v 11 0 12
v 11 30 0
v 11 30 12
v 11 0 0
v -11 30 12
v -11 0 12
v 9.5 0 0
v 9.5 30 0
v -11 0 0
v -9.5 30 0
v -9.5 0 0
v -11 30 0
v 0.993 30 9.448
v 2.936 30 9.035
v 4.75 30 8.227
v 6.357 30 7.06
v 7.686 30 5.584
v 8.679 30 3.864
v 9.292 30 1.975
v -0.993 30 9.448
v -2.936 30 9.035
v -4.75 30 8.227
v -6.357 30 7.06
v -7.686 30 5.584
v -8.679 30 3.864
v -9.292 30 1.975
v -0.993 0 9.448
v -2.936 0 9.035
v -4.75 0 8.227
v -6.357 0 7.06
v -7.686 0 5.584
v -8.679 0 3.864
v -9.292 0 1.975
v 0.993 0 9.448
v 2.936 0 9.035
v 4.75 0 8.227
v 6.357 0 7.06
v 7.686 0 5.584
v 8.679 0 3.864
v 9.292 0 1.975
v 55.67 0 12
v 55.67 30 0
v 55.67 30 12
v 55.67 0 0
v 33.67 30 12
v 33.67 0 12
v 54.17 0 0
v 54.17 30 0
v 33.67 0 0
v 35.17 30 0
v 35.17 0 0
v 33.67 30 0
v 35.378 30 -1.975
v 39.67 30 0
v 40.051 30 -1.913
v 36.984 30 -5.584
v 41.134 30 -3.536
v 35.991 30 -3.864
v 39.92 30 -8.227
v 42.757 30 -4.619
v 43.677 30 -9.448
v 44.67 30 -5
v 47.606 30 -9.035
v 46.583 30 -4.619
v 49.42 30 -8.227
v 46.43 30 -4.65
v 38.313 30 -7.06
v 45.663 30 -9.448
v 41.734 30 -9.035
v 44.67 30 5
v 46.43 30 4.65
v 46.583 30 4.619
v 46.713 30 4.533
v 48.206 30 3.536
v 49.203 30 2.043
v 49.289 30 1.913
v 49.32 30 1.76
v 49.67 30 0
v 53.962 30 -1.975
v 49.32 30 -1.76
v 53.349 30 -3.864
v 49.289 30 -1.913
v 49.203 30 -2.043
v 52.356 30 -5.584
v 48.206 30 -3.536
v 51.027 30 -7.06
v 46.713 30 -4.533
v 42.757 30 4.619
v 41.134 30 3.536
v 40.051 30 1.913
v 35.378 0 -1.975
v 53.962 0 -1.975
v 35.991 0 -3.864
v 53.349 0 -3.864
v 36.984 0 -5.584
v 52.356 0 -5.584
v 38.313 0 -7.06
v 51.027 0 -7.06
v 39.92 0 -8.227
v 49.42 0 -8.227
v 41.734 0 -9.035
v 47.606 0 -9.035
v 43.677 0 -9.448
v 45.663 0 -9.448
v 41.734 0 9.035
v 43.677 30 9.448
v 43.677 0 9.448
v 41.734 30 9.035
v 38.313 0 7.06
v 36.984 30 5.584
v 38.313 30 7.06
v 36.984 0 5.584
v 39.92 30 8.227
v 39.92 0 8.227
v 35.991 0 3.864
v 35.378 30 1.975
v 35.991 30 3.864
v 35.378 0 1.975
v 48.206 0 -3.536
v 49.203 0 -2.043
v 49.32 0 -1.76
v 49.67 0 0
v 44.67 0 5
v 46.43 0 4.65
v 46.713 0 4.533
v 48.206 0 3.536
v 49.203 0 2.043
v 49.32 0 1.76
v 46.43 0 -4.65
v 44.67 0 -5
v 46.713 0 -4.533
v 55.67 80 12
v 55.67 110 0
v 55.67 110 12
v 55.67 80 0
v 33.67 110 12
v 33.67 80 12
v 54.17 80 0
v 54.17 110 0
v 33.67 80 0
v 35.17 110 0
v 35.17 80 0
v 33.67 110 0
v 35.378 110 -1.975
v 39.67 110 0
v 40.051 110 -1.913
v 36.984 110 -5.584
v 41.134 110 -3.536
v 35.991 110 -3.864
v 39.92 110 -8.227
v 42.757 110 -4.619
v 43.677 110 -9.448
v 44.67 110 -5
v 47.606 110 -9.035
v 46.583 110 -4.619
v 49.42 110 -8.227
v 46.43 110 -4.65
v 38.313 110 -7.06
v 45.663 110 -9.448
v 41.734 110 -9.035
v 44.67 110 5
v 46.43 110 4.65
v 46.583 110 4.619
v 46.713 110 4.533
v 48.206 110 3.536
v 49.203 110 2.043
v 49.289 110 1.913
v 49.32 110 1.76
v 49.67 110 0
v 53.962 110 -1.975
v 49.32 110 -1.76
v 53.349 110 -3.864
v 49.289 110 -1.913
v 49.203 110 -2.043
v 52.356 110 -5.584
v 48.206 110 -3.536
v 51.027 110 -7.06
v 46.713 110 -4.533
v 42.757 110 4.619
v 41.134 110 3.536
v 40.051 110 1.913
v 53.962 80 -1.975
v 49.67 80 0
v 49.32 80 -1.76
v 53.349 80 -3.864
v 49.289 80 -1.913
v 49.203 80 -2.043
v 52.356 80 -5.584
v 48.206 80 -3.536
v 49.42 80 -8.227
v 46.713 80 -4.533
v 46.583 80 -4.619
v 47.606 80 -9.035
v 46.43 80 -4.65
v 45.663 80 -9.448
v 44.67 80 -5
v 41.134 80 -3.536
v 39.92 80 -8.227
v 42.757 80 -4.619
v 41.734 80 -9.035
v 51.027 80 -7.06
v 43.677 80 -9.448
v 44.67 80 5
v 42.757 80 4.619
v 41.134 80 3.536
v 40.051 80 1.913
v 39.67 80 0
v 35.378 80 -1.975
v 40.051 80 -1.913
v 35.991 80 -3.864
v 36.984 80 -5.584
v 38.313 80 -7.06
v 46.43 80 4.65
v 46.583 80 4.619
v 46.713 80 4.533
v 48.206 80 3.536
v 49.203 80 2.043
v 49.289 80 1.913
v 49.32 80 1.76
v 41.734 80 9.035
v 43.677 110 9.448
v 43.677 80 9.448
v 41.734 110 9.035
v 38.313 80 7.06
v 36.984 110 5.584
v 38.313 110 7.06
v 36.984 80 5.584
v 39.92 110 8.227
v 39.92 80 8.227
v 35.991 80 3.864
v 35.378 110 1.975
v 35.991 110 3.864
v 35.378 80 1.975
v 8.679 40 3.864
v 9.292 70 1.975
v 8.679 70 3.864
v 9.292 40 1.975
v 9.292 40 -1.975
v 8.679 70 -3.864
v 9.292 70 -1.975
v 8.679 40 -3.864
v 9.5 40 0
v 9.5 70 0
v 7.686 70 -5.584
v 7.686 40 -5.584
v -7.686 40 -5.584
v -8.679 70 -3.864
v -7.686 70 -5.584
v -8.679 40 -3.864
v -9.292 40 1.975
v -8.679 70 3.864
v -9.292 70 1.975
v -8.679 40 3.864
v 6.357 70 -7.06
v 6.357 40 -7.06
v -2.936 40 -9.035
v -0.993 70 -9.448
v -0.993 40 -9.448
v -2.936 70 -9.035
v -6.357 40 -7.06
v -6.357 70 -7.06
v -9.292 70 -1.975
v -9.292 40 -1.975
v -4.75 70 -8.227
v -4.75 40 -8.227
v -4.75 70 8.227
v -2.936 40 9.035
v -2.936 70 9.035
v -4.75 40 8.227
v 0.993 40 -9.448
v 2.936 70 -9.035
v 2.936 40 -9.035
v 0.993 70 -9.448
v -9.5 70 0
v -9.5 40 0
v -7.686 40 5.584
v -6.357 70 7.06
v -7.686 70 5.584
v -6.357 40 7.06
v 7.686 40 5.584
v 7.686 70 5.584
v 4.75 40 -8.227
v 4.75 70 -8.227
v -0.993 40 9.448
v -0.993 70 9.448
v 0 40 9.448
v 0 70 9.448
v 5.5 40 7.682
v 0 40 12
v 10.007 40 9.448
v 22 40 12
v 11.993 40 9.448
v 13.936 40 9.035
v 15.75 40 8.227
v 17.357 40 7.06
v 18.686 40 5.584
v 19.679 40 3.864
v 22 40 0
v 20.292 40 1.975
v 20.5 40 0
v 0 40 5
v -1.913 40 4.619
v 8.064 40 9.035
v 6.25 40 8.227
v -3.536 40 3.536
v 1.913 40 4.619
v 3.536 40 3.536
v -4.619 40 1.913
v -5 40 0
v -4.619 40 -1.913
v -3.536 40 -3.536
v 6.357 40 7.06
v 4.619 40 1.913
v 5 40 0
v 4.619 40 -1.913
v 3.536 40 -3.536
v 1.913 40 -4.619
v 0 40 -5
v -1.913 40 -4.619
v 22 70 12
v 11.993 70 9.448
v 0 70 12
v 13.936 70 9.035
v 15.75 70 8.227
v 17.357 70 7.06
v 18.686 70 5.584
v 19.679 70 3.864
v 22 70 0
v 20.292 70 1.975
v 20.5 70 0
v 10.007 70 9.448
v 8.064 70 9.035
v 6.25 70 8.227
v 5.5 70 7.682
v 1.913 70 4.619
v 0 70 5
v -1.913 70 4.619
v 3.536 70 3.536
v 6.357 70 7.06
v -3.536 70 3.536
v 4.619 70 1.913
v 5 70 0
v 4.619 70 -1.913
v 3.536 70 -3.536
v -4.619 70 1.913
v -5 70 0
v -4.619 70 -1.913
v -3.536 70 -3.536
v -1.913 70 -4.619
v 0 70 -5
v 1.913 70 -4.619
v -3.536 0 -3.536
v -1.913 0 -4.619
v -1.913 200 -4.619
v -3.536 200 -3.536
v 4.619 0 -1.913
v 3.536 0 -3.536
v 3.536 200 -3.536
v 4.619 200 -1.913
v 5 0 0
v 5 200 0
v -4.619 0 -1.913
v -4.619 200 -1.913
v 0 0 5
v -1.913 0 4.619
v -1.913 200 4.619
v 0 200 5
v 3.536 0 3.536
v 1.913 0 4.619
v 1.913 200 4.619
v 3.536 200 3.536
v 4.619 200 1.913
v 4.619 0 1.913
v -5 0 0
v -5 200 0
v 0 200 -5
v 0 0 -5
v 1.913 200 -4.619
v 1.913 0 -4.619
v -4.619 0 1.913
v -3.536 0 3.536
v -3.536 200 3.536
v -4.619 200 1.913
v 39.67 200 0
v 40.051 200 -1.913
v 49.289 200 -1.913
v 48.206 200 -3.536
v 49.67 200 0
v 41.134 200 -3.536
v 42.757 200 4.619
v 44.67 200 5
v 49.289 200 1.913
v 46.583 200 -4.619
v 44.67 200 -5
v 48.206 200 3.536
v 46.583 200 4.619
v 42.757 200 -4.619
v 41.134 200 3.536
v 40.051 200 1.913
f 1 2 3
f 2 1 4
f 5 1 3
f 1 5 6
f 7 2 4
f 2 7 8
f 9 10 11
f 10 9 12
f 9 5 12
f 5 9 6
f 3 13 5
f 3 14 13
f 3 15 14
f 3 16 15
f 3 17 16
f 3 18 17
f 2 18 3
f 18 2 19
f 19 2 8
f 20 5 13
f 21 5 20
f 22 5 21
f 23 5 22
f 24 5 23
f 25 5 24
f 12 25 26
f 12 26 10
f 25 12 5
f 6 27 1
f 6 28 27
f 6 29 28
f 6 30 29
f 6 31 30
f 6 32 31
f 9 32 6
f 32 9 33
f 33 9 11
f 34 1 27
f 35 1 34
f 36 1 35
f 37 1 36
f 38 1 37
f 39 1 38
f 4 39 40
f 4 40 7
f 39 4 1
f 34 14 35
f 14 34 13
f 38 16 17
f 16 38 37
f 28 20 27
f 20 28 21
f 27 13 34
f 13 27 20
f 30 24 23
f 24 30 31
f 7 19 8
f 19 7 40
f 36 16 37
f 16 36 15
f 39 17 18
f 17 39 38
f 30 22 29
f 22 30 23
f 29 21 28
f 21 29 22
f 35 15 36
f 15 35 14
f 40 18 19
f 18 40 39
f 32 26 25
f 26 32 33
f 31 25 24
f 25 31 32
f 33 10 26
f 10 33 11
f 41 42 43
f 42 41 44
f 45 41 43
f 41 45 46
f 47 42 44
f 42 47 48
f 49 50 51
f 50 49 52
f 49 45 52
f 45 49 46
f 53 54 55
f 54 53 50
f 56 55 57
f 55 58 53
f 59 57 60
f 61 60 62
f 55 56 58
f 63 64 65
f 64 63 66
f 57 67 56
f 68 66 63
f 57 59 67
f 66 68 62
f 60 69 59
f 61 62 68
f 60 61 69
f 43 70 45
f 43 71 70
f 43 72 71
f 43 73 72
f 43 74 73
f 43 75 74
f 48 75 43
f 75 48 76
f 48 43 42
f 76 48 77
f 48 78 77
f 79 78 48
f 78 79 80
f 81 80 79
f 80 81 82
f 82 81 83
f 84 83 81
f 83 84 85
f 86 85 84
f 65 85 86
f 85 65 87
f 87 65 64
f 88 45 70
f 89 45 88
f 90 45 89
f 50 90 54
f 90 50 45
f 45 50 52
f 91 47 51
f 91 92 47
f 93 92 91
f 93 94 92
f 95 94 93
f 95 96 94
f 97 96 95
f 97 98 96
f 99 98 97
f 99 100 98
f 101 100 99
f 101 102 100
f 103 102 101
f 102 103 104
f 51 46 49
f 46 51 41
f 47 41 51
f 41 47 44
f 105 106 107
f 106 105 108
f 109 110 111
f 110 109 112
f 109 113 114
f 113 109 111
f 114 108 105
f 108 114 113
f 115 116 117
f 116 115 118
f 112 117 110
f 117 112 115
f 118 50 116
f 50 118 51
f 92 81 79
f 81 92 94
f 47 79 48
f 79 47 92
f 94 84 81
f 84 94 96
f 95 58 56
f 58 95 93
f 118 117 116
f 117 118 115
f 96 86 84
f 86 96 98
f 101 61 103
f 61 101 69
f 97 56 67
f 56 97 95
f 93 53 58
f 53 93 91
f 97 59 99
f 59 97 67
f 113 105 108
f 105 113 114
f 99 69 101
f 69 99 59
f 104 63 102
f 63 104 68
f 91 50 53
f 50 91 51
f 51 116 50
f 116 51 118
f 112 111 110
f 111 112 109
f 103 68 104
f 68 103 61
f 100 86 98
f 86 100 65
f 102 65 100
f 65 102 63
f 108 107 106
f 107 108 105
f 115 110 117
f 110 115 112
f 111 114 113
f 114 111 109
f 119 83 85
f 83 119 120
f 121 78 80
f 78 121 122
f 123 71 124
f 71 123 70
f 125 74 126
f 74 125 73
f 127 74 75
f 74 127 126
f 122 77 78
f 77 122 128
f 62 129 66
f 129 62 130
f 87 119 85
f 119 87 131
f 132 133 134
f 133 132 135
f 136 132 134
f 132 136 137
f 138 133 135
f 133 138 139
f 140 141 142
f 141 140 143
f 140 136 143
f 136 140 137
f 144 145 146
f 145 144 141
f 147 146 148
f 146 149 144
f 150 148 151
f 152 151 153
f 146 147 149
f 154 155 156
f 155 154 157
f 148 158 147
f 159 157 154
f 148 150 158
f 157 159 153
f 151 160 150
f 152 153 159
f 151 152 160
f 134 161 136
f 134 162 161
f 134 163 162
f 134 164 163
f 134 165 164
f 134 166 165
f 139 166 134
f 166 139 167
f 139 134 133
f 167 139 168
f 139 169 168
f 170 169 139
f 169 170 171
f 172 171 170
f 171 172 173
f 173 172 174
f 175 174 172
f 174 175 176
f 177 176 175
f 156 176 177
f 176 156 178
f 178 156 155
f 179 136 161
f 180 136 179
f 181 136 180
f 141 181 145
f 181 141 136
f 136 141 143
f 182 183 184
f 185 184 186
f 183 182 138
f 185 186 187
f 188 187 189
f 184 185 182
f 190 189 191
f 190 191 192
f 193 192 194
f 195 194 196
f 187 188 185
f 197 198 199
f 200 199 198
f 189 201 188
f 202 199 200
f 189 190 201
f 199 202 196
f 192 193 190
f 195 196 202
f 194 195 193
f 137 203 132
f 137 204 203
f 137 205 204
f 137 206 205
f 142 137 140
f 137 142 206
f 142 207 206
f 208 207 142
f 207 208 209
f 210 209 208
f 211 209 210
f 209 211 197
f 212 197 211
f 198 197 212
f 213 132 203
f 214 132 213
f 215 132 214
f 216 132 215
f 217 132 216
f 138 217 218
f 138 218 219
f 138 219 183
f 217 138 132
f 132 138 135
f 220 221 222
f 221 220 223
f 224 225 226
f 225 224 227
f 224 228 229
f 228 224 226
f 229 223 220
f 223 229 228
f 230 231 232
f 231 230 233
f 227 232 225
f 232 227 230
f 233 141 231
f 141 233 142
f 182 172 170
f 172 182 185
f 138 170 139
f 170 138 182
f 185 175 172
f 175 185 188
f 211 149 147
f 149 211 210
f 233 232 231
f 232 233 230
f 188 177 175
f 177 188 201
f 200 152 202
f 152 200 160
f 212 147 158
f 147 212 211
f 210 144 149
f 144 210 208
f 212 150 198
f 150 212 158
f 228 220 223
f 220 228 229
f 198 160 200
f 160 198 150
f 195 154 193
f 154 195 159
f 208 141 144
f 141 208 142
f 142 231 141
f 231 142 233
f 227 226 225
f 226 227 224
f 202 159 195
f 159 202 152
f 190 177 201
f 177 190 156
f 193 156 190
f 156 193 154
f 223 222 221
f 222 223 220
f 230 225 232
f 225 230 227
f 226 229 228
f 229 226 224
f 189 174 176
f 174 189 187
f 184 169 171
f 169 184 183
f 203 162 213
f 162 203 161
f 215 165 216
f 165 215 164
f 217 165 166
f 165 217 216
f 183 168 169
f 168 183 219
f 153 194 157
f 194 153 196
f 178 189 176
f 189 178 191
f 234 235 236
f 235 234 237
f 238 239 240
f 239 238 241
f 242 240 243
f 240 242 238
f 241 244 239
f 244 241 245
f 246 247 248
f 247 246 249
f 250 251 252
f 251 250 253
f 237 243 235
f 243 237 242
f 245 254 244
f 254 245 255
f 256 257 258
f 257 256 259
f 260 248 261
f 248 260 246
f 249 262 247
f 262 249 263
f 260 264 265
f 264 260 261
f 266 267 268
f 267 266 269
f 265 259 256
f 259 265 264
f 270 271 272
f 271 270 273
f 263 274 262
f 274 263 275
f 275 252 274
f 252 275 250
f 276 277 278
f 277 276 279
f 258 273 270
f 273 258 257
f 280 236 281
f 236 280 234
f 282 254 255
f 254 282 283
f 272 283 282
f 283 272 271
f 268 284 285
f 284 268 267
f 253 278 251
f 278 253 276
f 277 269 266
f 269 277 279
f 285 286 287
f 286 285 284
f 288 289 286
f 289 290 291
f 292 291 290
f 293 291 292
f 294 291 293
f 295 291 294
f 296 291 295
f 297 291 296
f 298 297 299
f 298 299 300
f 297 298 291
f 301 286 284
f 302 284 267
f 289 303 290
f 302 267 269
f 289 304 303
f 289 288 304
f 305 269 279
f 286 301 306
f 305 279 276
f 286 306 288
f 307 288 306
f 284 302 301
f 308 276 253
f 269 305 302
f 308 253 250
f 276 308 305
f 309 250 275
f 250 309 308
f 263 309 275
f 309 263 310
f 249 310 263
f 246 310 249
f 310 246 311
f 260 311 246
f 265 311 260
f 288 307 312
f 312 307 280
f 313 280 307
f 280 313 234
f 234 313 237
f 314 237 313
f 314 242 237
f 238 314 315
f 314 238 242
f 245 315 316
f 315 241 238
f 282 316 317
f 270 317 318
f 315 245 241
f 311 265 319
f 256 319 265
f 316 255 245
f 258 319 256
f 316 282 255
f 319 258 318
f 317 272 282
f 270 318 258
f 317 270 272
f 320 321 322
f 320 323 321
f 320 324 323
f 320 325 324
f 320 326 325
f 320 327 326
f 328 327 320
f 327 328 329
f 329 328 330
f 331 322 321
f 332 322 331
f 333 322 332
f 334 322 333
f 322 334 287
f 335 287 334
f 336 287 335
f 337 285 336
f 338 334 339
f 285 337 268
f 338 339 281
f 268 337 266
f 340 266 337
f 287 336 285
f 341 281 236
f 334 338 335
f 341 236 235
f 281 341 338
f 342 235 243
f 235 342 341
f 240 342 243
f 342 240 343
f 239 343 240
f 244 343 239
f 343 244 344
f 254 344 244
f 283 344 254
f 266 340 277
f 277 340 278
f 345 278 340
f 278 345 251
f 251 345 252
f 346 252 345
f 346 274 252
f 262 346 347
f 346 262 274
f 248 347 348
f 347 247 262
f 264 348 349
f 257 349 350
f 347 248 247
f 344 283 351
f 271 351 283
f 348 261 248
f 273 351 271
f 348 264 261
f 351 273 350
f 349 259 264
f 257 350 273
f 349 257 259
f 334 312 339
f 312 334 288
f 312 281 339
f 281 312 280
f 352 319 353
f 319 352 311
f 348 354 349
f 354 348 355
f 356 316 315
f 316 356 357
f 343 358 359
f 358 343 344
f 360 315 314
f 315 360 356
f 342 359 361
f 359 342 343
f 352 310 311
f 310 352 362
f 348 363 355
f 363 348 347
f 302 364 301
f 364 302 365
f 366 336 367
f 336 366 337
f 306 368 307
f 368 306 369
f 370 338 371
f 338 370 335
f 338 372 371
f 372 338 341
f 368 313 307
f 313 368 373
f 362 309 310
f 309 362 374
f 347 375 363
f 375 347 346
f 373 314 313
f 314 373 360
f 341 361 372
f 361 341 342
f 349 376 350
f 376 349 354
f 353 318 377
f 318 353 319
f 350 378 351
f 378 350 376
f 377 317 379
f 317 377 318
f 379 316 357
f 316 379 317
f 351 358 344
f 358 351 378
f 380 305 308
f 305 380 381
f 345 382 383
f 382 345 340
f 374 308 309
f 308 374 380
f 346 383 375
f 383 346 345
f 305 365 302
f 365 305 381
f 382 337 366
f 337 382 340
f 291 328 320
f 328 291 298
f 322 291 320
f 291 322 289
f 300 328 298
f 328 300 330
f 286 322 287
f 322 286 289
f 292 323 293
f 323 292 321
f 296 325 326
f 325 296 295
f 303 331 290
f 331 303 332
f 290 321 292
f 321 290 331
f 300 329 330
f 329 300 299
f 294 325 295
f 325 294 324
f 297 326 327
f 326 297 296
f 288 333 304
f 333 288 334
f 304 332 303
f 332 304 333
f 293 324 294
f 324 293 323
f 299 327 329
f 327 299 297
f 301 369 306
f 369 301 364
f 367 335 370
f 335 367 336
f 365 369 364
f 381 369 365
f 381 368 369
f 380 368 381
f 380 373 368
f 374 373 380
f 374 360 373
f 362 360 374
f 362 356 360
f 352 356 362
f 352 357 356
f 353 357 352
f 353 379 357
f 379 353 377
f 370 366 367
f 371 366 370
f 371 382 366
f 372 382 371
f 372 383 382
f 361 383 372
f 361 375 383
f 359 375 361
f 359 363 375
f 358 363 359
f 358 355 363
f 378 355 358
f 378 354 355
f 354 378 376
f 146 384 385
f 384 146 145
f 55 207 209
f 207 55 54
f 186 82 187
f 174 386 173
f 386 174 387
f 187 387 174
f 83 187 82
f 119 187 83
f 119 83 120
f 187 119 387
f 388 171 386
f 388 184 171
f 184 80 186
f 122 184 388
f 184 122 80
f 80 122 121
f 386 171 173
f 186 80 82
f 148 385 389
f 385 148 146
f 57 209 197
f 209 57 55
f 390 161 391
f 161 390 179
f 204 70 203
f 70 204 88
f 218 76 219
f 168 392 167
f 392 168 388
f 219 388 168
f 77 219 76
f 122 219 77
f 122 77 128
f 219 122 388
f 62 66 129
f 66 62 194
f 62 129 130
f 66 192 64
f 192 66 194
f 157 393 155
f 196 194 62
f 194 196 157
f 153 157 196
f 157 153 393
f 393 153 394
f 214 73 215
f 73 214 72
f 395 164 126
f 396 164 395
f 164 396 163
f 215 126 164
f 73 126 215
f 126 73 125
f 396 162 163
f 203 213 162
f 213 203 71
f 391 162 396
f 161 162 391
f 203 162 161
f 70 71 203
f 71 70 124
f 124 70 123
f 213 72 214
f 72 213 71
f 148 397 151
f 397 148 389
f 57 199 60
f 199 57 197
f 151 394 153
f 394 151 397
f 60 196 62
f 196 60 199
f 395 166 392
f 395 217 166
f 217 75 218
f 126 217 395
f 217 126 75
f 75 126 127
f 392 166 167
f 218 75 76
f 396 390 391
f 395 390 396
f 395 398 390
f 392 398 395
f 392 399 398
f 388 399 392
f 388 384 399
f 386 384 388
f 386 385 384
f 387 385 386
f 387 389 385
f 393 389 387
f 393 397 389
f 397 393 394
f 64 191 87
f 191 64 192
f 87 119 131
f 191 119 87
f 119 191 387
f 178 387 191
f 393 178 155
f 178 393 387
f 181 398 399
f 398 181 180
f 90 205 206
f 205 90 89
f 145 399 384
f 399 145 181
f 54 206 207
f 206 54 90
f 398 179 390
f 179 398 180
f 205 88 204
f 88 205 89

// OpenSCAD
dlugosc_lozyska=30;
srednica_lozyska=19;
wewnetrzna_srednica_lozyska=10;

margin=2;

odstep_miedzy_lozyskami=80;

dlugosc_sanek=200;
rozstaw_osi=44.67;


module bearing(x,y,z,r)
{
    difference()
    {
        cube([x+margin,y,z+margin]);
        rotate([-90,0,0]) 
        translate([x/2+margin/2,0,0])
        cylinder(y,r/2,r/2,false);
    }
}


module sanki(r)
{
    rotate([-90,0,0])
    cylinder(dlugosc_sanek,r/2,r/2,false);
    
    rotate([-90,0,0])
    translate([rozstaw_osi,0,0])
    cylinder(dlugosc_sanek,r/2,r/2,false);
}

module LM10UU()
{
    //LM10UU
    difference(){
        rotate([-90,0,0])
        cylinder(dlugosc_lozyska,srednica_lozyska/2,srednica_lozyska/2,false);
        rotate([-90,0,0])
        cylinder(dlugosc_lozyska,wewnetrzna_srednica_lozyska/2,wewnetrzna_srednica_lozyska/2,false);
    }
    
}

translate([-20/2-margin/2,0,0]) bearing(20,30,10,19);

translate([rozstaw_osi-20/2-margin/2,0,0]) bearing(20,30,10,19);
translate([rozstaw_osi,0,0]) LM10UU();

translate([rozstaw_osi-20/2-margin/2,odstep_miedzy_lozyskami,0]) bearing(20,30,10,19);
translate([rozstaw_osi,odstep_miedzy_lozyskami,0]) LM10UU();

translate([0,odstep_miedzy_lozyskami/2,0]) LM10UU();
translate([0,odstep_miedzy_lozyskami/2,0]) bearing(20,30,10,19);


sanki(10);
